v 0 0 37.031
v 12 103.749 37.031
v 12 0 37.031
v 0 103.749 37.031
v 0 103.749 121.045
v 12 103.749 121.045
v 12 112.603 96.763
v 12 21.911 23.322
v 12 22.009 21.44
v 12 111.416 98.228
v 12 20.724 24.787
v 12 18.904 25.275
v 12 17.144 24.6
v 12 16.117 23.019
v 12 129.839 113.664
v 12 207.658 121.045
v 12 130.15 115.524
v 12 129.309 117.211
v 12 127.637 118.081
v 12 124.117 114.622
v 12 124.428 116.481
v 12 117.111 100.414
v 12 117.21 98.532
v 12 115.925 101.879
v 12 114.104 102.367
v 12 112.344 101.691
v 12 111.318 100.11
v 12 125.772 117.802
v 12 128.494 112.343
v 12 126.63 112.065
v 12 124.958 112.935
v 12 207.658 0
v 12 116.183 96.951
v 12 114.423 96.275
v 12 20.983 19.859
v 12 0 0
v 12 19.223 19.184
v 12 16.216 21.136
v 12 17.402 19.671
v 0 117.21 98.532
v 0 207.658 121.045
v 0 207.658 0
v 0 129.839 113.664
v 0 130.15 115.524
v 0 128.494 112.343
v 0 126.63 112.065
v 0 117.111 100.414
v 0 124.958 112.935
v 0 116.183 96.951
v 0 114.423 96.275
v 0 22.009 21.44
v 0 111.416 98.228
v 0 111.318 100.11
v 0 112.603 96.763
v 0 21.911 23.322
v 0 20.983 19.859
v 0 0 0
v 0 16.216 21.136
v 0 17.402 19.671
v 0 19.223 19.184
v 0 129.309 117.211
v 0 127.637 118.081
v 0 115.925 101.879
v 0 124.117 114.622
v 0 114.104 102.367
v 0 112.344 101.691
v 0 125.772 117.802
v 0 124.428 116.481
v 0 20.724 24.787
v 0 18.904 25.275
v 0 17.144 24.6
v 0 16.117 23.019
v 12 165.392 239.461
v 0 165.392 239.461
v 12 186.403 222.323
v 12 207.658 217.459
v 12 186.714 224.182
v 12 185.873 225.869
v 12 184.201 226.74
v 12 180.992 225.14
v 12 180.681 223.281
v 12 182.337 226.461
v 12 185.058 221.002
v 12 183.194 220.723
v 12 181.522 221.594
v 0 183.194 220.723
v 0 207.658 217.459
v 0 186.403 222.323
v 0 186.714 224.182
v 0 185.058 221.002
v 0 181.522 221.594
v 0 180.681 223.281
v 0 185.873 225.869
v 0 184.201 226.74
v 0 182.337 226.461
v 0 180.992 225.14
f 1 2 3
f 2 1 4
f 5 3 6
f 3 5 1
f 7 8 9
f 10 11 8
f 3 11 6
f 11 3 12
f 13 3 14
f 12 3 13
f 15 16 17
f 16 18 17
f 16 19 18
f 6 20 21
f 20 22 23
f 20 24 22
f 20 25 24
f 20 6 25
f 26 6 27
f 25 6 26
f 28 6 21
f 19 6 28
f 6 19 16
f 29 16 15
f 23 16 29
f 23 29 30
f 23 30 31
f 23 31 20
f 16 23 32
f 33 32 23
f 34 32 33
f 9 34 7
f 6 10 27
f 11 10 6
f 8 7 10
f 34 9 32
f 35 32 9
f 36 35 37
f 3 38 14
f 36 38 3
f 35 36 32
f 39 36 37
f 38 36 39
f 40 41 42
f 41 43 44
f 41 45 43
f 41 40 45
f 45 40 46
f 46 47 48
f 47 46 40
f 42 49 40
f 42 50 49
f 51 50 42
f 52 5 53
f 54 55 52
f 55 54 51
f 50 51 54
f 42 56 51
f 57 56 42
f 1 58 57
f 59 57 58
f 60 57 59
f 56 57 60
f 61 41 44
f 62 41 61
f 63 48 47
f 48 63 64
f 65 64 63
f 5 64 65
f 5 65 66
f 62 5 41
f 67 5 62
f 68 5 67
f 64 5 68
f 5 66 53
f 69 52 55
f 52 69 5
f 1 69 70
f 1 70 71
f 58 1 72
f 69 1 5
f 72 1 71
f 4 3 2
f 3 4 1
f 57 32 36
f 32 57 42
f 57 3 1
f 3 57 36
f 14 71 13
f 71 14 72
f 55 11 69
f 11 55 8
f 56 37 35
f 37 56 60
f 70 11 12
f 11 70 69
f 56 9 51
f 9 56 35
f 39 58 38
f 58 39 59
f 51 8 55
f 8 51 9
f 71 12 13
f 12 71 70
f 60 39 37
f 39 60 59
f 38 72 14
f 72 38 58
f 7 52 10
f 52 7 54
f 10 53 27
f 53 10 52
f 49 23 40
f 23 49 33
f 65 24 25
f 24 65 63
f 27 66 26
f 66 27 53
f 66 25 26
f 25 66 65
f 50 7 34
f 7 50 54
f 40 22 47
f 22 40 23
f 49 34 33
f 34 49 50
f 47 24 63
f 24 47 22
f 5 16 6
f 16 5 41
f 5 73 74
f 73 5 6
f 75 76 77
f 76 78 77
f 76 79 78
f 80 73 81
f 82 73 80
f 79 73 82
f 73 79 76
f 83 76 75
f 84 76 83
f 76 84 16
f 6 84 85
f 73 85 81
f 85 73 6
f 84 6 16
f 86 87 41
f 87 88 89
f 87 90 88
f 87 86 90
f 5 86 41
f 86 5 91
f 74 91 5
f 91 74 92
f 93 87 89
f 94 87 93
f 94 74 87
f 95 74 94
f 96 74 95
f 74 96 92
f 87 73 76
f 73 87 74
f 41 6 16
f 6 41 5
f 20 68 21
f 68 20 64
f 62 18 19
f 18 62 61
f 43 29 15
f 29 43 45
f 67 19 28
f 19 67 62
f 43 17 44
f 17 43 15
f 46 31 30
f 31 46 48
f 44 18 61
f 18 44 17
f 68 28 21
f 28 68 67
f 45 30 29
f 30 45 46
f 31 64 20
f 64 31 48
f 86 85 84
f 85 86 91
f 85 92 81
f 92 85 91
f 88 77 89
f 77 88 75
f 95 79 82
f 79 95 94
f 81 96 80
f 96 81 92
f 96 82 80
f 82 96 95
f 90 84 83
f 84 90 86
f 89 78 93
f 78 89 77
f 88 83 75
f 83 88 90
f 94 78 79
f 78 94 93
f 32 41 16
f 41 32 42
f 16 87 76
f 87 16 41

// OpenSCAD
threeUHeight = 133.35; //overall 3u height, provided for reference
panelOuterHeight =128.5;
panelInnerHeight = 110; //rail clearance = ~11.675mm, top and bottom

railDistance = 122.5; //center-to-center rail distance
railThickness = 11;//The overall thickness of the rails. Assumes mount hoiles are centered within the rail.

railDepth = 47.65; //How deep your rails are, front to back. 
minimumModuleDepth = 32;//Ensures a minimum depth. If less than the railDepth, uses railDepth instead

bracketScrewHoleDiameter = 6.1; //The diameter of the bracket screw; defaults to typical m6 diameter (6.1)
bracketNutOffset = 23.5;//Assuming you are using https://www.thingiverse.com/thing:2489238, this value will be one half the rail depth
bracketThickness = 12;

extraBracketHeight =0; //A little extra depth added to the bottom of the bracket for more clearance;

tiers = 2;//supports one or two tiers at the moment. I'll bet you'd have a hard time fitting a three-tier rack end on your print bed anyway. Values over 2 will assume you meant to type 2. Values under one will assume 1.

tierOneAngle = 39; //The angle of the first tier
tierTwoAngle =62.5; //The angle of the second tier

module testBracket(){
	translate([0,((railDepth)*sin(tierOneAngle)/sin(90)),0]){
rotate([tierOneAngle,0,0]){
translate([-400,0,0]){
cube([400,railThickness,railDepth]);
}
}}
}

rackEnd();

module rackEnd()
{

tierOneBaseHeight = (((railDepth > minimumModuleDepth ? railDepth : minimumModuleDepth)*sin(90-tierOneAngle))/sin(90));

tierTwoBaseHeight = (((railDepth > minimumModuleDepth ? railDepth : minimumModuleDepth)*sin(90-tierTwoAngle))/sin(90));

difference(){
union(){
bracket(tierOneAngle,tierOneBaseHeight);

if(tiers>1){
hyp = railDistance+railThickness;

tierOneFrontDepth = getTriangleSideLength(tierOneAngle,hyp);

translate([0,tierOneFrontDepth+0,0]){
	bracket(tierTwoAngle, getTriangleSideLength(90-tierOneAngle,hyp)+tierOneBaseHeight);
}
}
}

//The tier one mount holes are often obstructed by the bottom corner of tier2, so re-diff them to avoid a whole lotta math
translate([0,0,tierOneBaseHeight]){
rotate([tierOneAngle,0,0]){
bracketHoles();
}}
}

}
module bracket(baseAngle, baseHeight)
{
intersection(){

echo(baseHeight);

    difference(){
union(){



cube([bracketThickness,totalSlopeDepth(baseAngle,railDistance+railThickness),baseHeight]);

translate([0,0,baseHeight]){
    slopeByAngle(baseAngle, railDistance+railThickness, bracketThickness);
    }
}

translate([0,0,baseHeight]){
rotate([baseAngle,0,0]){
bracketHoles();
}
}
}

hyp = railDistance+railThickness;
slopeApex = getTriangleSideLength(90-baseAngle,hyp);
backDepth = getTriangleSideLength(90-baseAngle,(railDepth>minimumModuleDepth?railDepth:minimumModuleDepth));

translate([-1,0,0]){
cube([bracketThickness+2,getTriangleSideLength(baseAngle,hyp)+backDepth,baseHeight+slopeApex]);
}}
}

module bracketHoles(){
    translate([0,railThickness/2,-bracketNutOffset]){
    bracketHole();
    translate([0,railDistance,0]){
        bracketHole();
        }
    }
}
module bracketHole(){
    rotate([0,90,0]){
    cylinder(r=bracketScrewHoleDiameter/2,h = bracketThickness*3, center=true);
    }
}


module slope(length,width,height)
{
	polyhedron(
               points=[[0,0,0], [length,0,0], [length,width,0], [0,width,0], [0,width,height], [length,width,height]],
               faces=[[0,1,2,3],[5,4,3,2],[0,4,5,1],[0,3,4],[5,2,1]]
               );
}

function getTriangleSideLength(angle, hyp) = (hyp*sin(90-angle));

function totalSlopeDepth(angle,hypotenuse) =
(getTriangleSideLength(angle,hypotenuse)/sin(90))+
	(((hypotenuse*sin(angle))/sin(90)*sin(angle))/sin(90-angle));

module slopeByAngle(angle, sideLength, thickness)
{
	angleOne = angle;
	angleTwo = 90 - angleOne;

	depth = (sideLength*sin(angleTwo))/sin(90);
	height = (sideLength*sin(angleOne))/sin(90);


	slope(thickness,depth,height);
	
	depth2 =(height*sin(-angleOne))/sin(angleTwo);

translate([0,totalSlopeDepth(angle,sideLength),0])
{
rotate([0,0,0]){
		slope(thickness,depth2,height);
}
}
}
